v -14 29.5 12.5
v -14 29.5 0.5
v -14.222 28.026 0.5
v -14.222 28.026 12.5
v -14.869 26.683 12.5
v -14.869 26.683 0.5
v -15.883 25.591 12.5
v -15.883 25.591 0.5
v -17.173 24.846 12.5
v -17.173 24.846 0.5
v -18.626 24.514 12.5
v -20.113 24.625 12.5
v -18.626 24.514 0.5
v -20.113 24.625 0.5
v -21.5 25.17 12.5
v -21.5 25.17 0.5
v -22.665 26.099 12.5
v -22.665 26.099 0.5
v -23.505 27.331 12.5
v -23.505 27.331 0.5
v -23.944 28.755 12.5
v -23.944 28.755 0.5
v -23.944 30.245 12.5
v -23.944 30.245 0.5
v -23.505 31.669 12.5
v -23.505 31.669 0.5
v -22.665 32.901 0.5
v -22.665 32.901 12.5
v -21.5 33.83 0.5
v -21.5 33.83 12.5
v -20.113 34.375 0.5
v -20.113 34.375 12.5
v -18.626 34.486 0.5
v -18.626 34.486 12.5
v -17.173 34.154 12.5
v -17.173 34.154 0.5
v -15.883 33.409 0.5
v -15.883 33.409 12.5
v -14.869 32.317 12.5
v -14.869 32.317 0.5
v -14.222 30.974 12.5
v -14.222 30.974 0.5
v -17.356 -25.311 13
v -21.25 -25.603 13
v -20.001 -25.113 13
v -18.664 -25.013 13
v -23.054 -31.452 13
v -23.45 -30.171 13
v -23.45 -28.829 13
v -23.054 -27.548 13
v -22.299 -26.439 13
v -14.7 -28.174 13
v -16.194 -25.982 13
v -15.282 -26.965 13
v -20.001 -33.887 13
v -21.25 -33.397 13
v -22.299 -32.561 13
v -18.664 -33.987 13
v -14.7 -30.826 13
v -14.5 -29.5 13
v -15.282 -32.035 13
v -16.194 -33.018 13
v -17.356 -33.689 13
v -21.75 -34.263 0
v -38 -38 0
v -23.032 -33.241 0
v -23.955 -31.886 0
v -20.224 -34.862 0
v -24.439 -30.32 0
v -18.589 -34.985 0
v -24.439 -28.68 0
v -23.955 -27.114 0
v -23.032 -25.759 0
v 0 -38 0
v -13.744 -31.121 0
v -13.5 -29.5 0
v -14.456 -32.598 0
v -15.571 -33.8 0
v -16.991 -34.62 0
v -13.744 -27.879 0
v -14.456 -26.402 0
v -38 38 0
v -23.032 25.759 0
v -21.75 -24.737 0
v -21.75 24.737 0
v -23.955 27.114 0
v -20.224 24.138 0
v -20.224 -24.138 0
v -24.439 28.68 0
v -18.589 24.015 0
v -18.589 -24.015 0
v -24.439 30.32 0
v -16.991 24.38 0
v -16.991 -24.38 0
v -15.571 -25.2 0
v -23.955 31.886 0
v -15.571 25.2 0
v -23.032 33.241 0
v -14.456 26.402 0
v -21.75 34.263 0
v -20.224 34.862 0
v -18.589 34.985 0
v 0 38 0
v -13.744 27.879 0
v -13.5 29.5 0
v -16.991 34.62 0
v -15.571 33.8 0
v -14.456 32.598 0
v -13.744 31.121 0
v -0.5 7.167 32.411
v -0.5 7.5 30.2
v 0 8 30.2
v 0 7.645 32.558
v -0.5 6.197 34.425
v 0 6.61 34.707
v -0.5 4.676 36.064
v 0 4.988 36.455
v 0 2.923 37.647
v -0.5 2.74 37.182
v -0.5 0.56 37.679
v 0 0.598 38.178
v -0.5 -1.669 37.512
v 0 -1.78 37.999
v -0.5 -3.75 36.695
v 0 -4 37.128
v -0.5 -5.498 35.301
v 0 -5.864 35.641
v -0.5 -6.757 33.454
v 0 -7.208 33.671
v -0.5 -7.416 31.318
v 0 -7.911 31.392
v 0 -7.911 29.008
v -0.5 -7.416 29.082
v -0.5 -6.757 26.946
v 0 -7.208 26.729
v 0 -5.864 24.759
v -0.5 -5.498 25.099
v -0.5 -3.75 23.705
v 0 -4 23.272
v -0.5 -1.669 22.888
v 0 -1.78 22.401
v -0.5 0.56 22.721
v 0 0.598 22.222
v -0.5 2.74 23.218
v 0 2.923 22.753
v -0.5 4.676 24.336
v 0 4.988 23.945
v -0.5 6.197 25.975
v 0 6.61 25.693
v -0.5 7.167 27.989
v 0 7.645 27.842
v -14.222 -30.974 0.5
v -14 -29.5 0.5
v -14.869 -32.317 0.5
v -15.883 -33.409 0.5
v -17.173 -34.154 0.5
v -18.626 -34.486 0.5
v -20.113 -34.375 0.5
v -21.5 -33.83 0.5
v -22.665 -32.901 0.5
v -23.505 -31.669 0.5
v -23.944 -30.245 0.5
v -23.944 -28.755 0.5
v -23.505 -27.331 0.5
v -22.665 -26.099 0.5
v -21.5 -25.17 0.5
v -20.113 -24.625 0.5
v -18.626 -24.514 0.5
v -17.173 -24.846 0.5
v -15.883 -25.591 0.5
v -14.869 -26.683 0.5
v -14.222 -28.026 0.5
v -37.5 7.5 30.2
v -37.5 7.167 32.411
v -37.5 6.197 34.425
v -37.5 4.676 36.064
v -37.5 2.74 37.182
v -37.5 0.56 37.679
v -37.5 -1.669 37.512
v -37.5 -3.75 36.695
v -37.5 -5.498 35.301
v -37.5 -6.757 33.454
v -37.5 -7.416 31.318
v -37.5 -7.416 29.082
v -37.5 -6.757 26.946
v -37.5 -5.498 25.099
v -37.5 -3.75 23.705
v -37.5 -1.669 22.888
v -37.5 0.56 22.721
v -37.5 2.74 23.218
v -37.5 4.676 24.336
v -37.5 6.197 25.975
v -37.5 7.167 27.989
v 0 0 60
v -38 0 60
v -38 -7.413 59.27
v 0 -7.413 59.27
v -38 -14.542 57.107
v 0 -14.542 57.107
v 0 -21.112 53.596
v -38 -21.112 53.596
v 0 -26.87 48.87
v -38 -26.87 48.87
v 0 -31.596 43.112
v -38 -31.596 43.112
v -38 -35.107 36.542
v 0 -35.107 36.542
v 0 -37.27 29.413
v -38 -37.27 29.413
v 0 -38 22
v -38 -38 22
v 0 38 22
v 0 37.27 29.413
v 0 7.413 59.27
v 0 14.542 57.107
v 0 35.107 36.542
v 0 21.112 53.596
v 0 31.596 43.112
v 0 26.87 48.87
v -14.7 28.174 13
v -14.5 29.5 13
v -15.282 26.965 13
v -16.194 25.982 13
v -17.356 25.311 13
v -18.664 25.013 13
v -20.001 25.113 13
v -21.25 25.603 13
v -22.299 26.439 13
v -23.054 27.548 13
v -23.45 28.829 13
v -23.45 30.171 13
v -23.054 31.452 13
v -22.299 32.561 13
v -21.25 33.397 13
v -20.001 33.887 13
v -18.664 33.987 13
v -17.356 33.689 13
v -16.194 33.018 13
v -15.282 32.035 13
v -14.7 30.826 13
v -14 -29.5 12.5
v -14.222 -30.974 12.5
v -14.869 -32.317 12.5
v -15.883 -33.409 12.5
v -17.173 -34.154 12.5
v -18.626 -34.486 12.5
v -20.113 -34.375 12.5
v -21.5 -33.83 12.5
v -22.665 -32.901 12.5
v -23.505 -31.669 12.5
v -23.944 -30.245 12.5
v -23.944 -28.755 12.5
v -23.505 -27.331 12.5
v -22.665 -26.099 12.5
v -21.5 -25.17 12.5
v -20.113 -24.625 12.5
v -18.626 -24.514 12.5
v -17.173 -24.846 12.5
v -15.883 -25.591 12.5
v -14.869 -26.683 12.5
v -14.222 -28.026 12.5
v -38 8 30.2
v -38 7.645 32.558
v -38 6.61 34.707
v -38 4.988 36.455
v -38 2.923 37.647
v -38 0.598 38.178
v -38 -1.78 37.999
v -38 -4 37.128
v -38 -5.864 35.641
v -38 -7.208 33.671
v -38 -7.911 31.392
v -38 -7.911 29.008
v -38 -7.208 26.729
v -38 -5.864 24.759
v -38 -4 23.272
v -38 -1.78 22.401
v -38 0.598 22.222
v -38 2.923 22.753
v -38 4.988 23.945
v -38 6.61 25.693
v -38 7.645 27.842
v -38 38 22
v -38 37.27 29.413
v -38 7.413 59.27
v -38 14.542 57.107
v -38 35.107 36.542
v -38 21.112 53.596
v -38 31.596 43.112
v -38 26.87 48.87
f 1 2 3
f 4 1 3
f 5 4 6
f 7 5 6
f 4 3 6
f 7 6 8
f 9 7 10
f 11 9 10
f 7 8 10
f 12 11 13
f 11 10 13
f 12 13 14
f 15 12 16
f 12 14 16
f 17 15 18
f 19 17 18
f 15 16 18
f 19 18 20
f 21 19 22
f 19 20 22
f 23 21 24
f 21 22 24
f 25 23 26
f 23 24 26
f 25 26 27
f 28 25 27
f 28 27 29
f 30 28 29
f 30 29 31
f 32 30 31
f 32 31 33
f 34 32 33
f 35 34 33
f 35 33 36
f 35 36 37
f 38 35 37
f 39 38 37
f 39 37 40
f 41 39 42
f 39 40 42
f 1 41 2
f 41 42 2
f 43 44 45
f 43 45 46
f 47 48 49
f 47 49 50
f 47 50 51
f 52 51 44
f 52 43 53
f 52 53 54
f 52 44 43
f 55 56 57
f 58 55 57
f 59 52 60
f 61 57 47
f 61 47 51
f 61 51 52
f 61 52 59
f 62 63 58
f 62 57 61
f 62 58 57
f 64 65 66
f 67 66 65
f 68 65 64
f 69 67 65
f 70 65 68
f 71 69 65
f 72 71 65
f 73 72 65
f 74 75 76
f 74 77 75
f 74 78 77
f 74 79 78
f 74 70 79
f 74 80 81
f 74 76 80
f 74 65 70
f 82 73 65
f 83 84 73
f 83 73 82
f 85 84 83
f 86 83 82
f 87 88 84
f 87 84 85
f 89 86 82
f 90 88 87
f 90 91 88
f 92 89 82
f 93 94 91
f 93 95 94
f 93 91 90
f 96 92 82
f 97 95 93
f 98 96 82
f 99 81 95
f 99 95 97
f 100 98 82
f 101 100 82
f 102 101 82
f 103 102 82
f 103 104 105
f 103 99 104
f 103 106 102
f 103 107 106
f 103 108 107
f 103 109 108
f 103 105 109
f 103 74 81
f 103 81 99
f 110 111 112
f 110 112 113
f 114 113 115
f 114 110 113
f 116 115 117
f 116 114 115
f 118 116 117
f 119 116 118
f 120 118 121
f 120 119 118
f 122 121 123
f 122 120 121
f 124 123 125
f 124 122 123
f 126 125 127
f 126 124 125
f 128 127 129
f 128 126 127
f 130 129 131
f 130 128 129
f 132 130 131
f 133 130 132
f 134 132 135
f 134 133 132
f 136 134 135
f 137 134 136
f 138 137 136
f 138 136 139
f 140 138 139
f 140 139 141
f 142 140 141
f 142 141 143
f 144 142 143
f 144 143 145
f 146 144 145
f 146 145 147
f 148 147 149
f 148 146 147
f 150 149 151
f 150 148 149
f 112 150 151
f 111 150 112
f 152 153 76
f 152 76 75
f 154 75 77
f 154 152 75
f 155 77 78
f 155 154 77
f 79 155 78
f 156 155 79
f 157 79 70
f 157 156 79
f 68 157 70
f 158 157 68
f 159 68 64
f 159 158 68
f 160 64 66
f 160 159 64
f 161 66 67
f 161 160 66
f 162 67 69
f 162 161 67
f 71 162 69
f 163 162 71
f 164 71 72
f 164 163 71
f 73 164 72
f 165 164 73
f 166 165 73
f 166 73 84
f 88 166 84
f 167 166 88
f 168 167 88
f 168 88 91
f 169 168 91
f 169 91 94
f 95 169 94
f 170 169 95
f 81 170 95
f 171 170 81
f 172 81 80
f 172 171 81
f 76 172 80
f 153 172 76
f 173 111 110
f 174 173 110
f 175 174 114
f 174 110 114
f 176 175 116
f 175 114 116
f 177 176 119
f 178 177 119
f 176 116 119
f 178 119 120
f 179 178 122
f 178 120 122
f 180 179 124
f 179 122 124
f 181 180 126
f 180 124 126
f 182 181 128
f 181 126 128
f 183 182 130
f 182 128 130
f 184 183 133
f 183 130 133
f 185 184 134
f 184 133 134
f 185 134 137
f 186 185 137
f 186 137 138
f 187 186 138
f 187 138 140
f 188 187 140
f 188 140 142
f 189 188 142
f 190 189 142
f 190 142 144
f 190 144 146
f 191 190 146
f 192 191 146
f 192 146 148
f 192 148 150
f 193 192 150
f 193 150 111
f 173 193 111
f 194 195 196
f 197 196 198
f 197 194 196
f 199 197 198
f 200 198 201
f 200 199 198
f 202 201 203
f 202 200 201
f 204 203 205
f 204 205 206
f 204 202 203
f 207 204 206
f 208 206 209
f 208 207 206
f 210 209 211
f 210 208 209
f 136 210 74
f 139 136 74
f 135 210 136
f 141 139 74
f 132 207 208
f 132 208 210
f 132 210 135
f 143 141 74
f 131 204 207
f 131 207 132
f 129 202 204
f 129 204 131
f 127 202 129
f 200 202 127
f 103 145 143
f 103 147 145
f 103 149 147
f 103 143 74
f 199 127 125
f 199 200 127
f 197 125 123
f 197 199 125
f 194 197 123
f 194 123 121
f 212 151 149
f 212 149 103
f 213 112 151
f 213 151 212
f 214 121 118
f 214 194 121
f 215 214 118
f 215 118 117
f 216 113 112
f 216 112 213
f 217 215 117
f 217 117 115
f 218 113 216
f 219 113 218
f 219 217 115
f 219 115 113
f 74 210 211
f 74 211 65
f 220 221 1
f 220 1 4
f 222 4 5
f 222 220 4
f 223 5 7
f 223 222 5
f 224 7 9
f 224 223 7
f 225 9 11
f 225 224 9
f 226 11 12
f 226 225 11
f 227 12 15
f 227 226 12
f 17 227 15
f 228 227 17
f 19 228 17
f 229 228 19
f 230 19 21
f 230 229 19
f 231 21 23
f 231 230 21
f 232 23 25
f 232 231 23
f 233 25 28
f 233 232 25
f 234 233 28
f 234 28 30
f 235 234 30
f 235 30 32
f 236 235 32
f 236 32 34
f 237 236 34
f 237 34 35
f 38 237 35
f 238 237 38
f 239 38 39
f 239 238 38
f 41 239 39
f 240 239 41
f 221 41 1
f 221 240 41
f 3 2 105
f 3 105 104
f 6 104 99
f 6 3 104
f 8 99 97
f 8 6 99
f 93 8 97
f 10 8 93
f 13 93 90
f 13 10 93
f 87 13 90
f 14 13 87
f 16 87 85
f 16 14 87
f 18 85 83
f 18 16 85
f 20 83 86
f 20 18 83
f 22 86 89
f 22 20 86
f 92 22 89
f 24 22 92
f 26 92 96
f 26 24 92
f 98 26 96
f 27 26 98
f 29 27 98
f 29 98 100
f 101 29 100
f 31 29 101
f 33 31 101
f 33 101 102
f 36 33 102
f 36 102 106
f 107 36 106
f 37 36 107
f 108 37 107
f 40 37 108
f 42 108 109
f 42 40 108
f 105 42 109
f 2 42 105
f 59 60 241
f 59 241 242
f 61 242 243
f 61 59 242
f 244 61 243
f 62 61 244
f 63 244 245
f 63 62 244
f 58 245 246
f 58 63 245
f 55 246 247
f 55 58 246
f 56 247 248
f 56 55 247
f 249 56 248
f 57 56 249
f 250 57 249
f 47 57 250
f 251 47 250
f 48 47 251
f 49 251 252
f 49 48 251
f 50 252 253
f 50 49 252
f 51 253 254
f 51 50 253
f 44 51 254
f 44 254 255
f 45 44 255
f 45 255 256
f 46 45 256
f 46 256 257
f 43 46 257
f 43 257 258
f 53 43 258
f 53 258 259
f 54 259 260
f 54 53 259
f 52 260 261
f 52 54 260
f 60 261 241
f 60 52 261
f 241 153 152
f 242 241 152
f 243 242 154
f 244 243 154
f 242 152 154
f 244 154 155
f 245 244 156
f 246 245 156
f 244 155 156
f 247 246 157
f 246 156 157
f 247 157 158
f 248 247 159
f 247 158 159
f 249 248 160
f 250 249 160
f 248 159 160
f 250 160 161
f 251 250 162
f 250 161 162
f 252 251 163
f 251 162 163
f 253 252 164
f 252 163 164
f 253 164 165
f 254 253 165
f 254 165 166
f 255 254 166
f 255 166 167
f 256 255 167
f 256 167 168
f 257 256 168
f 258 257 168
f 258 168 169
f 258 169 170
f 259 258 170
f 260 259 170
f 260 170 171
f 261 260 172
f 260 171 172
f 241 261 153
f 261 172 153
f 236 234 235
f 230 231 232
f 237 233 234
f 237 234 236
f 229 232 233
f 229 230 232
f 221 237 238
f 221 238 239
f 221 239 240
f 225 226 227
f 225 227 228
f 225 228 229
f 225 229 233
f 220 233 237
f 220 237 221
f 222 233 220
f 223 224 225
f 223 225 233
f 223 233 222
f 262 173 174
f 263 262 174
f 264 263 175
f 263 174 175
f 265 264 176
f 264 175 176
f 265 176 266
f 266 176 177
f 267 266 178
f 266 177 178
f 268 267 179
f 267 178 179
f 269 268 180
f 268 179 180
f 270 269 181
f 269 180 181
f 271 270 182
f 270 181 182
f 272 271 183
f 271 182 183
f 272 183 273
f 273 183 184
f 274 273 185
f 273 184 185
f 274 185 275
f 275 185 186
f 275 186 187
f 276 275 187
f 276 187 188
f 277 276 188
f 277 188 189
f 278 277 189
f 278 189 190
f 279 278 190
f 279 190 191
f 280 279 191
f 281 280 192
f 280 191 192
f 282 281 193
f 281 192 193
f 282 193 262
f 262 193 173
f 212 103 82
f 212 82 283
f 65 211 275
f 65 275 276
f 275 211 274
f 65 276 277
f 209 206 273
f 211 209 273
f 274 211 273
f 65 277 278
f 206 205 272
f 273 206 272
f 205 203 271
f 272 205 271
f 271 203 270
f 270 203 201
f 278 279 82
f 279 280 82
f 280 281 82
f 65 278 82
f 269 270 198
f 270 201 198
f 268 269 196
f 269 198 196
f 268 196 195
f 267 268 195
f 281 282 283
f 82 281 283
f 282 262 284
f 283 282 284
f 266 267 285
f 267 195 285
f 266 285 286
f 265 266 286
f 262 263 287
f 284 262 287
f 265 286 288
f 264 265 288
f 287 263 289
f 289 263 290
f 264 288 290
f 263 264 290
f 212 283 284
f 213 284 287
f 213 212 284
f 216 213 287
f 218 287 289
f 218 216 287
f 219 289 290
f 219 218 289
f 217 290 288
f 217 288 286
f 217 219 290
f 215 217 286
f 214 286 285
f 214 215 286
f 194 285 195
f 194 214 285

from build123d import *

# Parameters (mm, degrees)
F1_DEPTH = 38
F2_R     = 7.5
F3_DEPTH = 38.001
F4_SIZE  = 0.5
F5_R     = 5
F6_DEPTH = 13
F7_SIZE  = 0.5


# Not quite as in the source:
# - a feature names something its author has since deleted; it is built from what else it names


with BuildPart() as f1:
    # F0 (on Right) → F1 (new body)
    with BuildSketch(Plane.YZ):
        with BuildLine():
            Line((-38, 0), (0, 0))
            Line((0, 0), (38, 0))
            Line((38, 0), (38, 22))
            ThreePointArc((38, 22), (26.8700576851, 48.8700576851), (0, 60))
            ThreePointArc((0, 60), (-26.8700576851, 48.8700576851), (-38, 22))
            Line((-38, 22), (-38, 0))
        make_face()
    extrude(amount=-F1_DEPTH)

    # F2 (on face) → F3 (cut, through all)
    with BuildSketch(Plane.YZ):
        with Locations((0, 30.2)):
            Circle(F2_R)
    extrude(amount=-F3_DEPTH, mode=Mode.SUBTRACT)

    # F4
    f4_edges = [f1.edges().sort_by_distance(p)[0] for p in [
        (0, -7.5, 30.2),
        (-19, 7.5, 30.2),
        (-38, -7.5, 30.2),
    ]]
    chamfer(f4_edges, length=F4_SIZE)

    # F5 (on face) → F6 (cut)
    with BuildSketch(Plane(origin=(0, 0, 0), x_dir=(1, 0, 0), z_dir=(0, 0, -1))):
        with Locations((-19, 29.5)):
            Circle(F5_R)
        with Locations((-19, -29.5)):
            Circle(F5_R)
    extrude(amount=-F6_DEPTH, mode=Mode.SUBTRACT)

    # F7
    f7_edges = [f1.edges().sort_by_distance(p)[0] for p in [
        (-14, -29.5, 6.5),
        (-24, -29.5, 0),
        (-24, -29.5, 13),
        (-14, 29.5, 6.5),
        (-24, 29.5, 0),
        (-24, 29.5, 13),
    ]]
    chamfer(f7_edges, length=F7_SIZE)


solid = f1.part
